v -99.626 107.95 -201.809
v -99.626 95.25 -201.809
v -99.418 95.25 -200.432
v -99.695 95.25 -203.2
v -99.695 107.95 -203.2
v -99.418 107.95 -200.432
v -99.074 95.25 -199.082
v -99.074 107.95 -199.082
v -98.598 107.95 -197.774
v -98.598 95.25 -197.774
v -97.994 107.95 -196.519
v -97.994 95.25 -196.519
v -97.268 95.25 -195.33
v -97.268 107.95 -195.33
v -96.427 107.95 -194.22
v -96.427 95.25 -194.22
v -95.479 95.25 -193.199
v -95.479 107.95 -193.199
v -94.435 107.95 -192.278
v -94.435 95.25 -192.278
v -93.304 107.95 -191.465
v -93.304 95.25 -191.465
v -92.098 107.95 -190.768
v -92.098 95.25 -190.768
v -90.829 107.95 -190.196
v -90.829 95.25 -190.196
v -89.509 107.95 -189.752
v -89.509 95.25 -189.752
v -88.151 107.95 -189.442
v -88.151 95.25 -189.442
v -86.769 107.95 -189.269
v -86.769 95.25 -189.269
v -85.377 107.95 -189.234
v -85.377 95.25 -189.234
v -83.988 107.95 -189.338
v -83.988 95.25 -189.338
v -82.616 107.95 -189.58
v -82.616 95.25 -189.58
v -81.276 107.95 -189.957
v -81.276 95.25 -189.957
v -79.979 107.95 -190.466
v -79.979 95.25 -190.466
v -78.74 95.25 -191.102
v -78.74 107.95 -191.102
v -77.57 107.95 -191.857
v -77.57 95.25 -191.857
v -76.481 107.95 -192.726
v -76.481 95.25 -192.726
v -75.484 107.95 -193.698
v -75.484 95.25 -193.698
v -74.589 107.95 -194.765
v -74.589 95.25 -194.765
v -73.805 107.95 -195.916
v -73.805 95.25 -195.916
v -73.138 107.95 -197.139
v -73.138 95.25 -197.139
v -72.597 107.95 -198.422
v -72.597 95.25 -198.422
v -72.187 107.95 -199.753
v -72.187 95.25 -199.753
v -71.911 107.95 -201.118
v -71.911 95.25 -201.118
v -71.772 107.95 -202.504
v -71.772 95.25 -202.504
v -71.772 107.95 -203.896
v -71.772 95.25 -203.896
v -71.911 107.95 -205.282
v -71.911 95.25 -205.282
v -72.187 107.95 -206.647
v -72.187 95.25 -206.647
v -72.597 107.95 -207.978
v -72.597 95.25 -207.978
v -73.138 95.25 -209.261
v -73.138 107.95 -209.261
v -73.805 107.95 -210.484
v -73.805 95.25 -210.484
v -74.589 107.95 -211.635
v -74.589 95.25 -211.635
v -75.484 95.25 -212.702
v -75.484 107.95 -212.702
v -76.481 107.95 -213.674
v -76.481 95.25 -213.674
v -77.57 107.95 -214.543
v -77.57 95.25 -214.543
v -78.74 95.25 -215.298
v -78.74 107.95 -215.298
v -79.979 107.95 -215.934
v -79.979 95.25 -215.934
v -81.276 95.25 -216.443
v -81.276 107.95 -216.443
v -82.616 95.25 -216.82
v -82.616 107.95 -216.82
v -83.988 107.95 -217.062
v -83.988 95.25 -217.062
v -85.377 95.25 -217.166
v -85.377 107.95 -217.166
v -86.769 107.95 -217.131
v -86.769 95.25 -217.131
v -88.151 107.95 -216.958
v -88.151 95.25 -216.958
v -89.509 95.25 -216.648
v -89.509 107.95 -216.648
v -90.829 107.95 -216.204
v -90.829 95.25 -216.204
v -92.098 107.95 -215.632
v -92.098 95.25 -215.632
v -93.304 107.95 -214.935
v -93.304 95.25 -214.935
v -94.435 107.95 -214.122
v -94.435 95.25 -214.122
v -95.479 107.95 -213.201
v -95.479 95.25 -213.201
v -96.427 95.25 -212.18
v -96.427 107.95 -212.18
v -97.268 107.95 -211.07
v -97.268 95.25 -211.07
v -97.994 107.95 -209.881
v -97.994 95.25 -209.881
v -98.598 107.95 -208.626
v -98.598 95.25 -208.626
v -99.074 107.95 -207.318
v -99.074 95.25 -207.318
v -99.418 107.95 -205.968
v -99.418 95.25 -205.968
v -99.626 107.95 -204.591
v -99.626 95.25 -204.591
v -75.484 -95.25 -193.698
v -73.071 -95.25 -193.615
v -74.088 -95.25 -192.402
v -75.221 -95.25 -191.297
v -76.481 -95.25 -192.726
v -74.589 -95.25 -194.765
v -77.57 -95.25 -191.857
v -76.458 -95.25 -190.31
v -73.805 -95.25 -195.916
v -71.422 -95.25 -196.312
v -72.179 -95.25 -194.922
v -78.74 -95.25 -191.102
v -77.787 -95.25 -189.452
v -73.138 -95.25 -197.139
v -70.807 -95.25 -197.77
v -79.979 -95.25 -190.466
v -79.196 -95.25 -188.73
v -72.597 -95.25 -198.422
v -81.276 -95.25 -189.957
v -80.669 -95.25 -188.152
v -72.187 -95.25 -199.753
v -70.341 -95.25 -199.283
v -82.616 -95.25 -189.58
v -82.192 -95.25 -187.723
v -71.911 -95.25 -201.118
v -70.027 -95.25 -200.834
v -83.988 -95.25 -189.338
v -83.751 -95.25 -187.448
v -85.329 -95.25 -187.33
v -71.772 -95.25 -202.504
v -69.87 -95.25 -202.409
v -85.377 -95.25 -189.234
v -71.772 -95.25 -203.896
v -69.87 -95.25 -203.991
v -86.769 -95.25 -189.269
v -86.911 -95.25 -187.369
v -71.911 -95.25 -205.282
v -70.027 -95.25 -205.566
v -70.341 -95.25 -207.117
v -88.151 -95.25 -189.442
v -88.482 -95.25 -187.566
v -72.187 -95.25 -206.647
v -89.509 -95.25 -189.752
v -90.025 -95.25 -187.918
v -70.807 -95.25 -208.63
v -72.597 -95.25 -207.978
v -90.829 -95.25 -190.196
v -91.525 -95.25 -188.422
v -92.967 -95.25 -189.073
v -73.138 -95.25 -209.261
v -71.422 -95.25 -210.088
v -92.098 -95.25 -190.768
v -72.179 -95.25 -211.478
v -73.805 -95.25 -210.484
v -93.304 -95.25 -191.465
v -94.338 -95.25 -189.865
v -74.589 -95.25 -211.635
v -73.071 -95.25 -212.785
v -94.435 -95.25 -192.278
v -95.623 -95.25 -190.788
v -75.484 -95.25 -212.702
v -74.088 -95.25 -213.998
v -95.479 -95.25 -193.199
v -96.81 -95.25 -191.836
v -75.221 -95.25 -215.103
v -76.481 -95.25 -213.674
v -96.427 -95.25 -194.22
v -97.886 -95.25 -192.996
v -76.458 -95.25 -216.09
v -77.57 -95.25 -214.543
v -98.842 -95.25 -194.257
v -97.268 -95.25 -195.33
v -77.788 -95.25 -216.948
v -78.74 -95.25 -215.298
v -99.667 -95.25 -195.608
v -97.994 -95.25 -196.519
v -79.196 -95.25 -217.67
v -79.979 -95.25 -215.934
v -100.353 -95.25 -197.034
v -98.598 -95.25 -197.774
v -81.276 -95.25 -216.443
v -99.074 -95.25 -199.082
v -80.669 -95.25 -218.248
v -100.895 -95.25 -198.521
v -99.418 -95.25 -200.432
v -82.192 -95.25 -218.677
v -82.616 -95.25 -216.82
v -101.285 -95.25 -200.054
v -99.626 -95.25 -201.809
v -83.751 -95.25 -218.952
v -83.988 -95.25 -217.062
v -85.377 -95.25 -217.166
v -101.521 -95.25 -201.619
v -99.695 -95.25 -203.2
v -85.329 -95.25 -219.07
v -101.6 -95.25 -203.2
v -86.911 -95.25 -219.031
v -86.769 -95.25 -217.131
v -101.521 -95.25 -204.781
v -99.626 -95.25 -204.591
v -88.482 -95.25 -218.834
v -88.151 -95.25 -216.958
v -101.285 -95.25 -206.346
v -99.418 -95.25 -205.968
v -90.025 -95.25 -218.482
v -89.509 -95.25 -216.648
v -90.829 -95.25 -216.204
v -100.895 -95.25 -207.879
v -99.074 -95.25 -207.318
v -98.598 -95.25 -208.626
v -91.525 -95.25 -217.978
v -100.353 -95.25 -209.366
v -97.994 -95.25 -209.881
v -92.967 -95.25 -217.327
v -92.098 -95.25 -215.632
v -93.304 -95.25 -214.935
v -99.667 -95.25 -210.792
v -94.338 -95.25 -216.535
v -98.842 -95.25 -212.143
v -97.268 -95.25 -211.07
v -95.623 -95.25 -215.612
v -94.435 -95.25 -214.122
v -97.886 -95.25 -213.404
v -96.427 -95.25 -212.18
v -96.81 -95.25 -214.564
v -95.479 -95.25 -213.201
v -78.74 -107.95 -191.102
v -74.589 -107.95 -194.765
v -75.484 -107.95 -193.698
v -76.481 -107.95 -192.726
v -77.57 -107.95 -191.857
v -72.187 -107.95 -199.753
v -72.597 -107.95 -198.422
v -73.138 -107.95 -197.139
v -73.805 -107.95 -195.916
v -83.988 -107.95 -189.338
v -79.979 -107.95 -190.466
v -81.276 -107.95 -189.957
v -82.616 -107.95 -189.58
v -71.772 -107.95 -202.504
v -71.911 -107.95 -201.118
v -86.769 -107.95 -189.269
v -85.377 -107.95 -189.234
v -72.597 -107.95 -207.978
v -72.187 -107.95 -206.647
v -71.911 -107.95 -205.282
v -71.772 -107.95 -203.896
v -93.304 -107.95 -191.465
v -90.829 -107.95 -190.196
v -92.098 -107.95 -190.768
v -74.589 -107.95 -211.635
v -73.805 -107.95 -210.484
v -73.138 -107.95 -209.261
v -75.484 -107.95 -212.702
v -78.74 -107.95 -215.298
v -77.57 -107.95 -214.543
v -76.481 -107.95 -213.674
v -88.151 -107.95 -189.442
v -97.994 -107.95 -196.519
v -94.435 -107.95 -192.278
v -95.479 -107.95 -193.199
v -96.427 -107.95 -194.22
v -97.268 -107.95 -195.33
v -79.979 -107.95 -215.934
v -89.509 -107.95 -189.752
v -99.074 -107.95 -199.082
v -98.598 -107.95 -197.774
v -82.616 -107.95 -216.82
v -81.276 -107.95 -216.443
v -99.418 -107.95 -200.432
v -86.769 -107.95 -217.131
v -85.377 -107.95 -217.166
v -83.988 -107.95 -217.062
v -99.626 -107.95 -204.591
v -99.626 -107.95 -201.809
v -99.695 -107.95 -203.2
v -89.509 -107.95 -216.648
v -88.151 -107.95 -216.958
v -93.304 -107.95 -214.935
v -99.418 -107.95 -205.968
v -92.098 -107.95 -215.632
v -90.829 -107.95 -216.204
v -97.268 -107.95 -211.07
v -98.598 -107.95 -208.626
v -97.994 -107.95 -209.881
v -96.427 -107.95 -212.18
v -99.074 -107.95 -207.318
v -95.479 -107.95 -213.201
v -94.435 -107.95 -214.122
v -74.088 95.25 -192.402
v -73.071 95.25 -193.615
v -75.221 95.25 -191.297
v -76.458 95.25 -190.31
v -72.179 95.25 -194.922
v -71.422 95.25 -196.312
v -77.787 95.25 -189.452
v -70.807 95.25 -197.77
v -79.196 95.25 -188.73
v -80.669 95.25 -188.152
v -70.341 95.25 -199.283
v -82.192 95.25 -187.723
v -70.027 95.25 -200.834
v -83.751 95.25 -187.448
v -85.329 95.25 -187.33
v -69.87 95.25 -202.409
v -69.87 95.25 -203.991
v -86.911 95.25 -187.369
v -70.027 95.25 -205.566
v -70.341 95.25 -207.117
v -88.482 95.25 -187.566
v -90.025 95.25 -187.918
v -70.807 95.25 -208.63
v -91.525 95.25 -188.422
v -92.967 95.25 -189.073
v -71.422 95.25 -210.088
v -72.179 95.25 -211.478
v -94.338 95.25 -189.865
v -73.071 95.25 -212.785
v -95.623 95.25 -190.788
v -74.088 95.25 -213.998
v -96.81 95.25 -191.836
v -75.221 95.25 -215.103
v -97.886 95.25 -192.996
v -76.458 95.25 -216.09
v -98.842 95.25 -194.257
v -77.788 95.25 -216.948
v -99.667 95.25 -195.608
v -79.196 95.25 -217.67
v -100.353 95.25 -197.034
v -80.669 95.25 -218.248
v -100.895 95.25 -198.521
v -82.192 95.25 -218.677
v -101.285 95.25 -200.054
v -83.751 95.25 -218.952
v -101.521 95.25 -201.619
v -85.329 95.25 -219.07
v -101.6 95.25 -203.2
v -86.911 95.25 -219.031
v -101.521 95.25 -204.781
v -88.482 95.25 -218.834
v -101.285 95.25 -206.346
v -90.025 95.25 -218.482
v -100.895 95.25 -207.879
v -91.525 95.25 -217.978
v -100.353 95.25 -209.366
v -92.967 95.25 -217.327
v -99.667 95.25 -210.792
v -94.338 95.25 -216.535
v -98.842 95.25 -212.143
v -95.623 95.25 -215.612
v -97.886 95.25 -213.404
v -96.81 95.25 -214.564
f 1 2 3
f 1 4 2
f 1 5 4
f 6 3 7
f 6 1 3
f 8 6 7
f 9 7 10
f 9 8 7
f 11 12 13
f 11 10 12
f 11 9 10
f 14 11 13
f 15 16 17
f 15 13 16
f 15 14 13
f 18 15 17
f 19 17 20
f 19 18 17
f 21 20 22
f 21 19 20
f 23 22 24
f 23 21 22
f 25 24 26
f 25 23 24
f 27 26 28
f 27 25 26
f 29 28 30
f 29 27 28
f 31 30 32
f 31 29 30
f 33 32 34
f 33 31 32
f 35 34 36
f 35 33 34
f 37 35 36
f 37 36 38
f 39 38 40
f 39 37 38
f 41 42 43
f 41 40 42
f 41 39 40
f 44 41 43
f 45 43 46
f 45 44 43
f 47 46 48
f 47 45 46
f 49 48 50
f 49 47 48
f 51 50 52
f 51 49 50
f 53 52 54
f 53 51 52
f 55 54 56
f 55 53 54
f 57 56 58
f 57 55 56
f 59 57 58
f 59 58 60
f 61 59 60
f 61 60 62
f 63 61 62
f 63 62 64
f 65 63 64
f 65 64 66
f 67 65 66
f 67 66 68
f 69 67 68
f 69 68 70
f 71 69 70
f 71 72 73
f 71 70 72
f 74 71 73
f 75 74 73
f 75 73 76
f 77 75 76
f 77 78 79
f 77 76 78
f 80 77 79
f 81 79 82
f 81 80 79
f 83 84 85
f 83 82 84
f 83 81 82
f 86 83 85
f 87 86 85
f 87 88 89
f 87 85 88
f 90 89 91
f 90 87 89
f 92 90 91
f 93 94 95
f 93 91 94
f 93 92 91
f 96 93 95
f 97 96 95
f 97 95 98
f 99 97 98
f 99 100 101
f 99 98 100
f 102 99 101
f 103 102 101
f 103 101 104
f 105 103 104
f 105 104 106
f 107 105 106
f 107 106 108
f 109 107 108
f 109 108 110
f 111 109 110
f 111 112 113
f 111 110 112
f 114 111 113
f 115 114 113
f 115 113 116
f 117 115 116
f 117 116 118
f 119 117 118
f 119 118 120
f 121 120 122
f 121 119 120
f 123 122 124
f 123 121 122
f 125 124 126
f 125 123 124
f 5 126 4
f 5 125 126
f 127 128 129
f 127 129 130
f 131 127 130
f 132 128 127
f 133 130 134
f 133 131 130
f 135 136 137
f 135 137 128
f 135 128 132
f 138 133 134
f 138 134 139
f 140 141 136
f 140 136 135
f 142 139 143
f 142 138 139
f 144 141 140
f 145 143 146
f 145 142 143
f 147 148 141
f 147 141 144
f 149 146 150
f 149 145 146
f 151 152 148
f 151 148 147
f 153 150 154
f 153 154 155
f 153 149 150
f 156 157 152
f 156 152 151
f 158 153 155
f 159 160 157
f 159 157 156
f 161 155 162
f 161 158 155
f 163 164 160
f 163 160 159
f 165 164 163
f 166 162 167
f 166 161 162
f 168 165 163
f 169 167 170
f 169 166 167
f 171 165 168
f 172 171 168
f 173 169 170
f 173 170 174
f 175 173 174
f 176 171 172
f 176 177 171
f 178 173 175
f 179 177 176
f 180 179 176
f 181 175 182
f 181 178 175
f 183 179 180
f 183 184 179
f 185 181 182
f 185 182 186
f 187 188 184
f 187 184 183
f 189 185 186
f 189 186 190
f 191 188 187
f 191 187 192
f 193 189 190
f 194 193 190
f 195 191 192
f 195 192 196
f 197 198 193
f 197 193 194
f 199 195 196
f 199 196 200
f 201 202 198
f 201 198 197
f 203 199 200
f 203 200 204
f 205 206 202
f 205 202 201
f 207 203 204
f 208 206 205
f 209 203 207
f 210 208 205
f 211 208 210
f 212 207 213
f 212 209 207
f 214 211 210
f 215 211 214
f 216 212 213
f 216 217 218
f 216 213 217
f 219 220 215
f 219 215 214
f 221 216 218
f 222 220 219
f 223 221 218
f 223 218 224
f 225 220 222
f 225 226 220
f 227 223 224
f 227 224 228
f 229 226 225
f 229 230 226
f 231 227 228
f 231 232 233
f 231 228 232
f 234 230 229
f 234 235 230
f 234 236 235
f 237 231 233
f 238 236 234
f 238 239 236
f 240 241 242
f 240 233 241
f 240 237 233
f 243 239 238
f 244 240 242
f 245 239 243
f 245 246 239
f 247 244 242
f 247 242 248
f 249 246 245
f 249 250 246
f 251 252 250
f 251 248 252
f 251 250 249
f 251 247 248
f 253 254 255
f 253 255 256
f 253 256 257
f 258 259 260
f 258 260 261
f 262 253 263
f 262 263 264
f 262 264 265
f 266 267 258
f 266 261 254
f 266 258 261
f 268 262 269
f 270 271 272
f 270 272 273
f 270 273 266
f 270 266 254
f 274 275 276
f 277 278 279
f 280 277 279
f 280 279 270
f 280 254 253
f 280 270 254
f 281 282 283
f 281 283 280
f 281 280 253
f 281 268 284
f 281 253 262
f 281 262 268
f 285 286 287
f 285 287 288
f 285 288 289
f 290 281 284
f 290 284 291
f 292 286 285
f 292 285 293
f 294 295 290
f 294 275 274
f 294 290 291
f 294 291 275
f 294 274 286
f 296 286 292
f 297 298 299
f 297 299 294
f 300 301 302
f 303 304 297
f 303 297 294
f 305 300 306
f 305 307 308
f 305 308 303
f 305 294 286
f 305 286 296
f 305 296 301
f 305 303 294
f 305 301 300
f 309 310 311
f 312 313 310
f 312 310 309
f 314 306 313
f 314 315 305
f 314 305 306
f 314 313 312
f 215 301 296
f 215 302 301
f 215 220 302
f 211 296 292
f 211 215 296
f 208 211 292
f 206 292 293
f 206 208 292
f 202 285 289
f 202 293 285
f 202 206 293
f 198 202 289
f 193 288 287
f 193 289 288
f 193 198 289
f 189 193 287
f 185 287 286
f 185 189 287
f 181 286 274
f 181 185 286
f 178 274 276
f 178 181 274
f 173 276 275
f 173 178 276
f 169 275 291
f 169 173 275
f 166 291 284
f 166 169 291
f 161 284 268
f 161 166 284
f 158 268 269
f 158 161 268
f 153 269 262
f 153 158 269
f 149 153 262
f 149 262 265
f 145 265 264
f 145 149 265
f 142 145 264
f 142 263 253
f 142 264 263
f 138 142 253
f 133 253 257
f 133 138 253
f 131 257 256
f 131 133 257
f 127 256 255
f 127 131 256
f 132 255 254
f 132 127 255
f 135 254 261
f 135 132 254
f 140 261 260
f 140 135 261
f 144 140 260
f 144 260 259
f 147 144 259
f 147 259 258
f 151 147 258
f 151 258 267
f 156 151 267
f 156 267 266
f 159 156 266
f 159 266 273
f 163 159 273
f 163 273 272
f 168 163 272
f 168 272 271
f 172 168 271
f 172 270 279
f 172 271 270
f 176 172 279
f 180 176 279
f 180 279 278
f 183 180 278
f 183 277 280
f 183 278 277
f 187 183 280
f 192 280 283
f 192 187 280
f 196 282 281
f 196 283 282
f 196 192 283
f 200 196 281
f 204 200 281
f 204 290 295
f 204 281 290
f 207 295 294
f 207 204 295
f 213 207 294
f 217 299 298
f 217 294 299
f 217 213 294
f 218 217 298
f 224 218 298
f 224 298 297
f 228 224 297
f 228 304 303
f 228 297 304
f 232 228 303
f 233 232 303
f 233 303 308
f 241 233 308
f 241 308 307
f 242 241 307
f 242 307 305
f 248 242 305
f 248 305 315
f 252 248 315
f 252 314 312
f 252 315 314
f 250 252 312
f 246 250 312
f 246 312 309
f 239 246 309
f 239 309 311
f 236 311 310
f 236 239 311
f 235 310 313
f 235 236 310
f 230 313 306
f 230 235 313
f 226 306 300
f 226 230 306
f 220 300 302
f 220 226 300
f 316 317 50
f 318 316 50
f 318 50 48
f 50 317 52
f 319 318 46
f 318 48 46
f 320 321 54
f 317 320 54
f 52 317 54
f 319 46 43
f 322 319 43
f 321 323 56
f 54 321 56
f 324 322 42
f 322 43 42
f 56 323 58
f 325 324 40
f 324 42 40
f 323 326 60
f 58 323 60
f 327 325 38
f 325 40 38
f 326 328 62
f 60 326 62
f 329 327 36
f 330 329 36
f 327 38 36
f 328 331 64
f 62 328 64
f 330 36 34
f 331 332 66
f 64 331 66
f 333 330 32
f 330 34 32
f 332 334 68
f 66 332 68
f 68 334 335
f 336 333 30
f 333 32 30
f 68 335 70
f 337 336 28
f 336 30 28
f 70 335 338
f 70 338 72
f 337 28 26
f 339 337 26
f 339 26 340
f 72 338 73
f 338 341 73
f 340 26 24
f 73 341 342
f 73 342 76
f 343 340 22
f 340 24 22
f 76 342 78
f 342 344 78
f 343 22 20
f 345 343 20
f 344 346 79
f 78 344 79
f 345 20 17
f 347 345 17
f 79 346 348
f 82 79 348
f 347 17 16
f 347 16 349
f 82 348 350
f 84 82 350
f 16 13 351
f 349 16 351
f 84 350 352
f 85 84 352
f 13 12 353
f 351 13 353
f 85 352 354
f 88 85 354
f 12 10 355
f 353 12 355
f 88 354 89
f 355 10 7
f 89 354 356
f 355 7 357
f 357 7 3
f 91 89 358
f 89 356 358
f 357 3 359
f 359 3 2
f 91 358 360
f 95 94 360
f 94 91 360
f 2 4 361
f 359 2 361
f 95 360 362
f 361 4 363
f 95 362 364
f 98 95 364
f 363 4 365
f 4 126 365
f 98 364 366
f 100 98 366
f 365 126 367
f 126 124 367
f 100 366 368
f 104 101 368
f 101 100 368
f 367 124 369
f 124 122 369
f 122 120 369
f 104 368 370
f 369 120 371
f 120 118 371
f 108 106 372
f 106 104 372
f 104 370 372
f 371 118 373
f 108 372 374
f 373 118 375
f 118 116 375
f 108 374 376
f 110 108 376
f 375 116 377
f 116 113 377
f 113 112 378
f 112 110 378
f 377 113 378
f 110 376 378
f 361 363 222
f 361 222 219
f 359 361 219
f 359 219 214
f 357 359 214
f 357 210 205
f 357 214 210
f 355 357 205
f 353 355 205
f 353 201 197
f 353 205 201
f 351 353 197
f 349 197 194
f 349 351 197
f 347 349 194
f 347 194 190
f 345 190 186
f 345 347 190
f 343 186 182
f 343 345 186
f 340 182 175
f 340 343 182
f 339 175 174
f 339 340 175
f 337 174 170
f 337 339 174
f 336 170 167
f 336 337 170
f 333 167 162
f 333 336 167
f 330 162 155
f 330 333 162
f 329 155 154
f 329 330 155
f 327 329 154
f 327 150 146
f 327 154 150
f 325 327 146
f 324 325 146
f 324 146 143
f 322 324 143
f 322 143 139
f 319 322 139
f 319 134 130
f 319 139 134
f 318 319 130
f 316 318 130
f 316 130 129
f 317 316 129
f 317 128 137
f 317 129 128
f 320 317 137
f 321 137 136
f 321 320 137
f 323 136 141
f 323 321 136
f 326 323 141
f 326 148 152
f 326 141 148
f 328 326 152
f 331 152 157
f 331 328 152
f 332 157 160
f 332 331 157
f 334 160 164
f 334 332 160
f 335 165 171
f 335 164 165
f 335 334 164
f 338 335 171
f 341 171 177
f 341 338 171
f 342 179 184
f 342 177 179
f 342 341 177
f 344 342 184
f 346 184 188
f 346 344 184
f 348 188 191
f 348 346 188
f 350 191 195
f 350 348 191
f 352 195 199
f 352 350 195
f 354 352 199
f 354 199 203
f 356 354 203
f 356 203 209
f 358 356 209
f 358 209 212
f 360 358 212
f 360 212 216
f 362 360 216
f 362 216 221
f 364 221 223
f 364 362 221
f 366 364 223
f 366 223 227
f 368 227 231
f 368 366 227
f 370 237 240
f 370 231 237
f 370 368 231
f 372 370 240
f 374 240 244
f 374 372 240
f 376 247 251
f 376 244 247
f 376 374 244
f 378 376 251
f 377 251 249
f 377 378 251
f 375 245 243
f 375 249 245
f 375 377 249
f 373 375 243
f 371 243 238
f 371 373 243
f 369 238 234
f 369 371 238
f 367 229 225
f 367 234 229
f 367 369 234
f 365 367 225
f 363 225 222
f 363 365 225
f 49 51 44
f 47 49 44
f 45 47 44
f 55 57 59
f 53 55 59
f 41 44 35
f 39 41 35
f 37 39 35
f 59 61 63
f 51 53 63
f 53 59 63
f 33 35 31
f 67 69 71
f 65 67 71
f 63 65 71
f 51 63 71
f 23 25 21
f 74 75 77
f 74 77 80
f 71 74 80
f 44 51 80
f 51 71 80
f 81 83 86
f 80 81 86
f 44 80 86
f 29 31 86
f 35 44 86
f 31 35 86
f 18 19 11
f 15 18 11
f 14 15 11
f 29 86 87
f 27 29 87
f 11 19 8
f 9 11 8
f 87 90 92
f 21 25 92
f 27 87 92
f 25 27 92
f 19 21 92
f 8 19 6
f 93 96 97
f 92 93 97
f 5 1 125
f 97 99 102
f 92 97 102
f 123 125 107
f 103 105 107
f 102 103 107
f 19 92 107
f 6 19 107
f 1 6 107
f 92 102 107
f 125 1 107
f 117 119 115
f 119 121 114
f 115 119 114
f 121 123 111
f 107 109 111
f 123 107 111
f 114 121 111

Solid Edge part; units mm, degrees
sketch "Sketch1" plane through (0, 0, -203.2) normal (0, 0, 1) x (1, 0, 0)
  line L0 (-101.6, -95.25) -> (-101.6, 95.25)
  line L1 (-101.6, 95.25) -> (-99.695, 95.25)
  line L2 (-99.695, 95.25) -> (-99.695, 107.95)
  line L3 (-99.695, 107.95) -> (-85.725, 107.95)
  line L4 (-85.725, -107.95) -> (-99.695, -107.95)
  line L5 (-99.695, -107.95) -> (-99.695, -95.25)
  line L6 (-99.695, -95.25) -> (-101.6, -95.25)
  dimension "D1" = 13.97
  dimension "D2" = 6.35
  dimension "D3" = 12.7
revolve "RevolvedProtrusion1" add sketch "Sketch1" angle 360 about axis through (-85.725, 107.95, -203.2) along (0, -1, 0)
